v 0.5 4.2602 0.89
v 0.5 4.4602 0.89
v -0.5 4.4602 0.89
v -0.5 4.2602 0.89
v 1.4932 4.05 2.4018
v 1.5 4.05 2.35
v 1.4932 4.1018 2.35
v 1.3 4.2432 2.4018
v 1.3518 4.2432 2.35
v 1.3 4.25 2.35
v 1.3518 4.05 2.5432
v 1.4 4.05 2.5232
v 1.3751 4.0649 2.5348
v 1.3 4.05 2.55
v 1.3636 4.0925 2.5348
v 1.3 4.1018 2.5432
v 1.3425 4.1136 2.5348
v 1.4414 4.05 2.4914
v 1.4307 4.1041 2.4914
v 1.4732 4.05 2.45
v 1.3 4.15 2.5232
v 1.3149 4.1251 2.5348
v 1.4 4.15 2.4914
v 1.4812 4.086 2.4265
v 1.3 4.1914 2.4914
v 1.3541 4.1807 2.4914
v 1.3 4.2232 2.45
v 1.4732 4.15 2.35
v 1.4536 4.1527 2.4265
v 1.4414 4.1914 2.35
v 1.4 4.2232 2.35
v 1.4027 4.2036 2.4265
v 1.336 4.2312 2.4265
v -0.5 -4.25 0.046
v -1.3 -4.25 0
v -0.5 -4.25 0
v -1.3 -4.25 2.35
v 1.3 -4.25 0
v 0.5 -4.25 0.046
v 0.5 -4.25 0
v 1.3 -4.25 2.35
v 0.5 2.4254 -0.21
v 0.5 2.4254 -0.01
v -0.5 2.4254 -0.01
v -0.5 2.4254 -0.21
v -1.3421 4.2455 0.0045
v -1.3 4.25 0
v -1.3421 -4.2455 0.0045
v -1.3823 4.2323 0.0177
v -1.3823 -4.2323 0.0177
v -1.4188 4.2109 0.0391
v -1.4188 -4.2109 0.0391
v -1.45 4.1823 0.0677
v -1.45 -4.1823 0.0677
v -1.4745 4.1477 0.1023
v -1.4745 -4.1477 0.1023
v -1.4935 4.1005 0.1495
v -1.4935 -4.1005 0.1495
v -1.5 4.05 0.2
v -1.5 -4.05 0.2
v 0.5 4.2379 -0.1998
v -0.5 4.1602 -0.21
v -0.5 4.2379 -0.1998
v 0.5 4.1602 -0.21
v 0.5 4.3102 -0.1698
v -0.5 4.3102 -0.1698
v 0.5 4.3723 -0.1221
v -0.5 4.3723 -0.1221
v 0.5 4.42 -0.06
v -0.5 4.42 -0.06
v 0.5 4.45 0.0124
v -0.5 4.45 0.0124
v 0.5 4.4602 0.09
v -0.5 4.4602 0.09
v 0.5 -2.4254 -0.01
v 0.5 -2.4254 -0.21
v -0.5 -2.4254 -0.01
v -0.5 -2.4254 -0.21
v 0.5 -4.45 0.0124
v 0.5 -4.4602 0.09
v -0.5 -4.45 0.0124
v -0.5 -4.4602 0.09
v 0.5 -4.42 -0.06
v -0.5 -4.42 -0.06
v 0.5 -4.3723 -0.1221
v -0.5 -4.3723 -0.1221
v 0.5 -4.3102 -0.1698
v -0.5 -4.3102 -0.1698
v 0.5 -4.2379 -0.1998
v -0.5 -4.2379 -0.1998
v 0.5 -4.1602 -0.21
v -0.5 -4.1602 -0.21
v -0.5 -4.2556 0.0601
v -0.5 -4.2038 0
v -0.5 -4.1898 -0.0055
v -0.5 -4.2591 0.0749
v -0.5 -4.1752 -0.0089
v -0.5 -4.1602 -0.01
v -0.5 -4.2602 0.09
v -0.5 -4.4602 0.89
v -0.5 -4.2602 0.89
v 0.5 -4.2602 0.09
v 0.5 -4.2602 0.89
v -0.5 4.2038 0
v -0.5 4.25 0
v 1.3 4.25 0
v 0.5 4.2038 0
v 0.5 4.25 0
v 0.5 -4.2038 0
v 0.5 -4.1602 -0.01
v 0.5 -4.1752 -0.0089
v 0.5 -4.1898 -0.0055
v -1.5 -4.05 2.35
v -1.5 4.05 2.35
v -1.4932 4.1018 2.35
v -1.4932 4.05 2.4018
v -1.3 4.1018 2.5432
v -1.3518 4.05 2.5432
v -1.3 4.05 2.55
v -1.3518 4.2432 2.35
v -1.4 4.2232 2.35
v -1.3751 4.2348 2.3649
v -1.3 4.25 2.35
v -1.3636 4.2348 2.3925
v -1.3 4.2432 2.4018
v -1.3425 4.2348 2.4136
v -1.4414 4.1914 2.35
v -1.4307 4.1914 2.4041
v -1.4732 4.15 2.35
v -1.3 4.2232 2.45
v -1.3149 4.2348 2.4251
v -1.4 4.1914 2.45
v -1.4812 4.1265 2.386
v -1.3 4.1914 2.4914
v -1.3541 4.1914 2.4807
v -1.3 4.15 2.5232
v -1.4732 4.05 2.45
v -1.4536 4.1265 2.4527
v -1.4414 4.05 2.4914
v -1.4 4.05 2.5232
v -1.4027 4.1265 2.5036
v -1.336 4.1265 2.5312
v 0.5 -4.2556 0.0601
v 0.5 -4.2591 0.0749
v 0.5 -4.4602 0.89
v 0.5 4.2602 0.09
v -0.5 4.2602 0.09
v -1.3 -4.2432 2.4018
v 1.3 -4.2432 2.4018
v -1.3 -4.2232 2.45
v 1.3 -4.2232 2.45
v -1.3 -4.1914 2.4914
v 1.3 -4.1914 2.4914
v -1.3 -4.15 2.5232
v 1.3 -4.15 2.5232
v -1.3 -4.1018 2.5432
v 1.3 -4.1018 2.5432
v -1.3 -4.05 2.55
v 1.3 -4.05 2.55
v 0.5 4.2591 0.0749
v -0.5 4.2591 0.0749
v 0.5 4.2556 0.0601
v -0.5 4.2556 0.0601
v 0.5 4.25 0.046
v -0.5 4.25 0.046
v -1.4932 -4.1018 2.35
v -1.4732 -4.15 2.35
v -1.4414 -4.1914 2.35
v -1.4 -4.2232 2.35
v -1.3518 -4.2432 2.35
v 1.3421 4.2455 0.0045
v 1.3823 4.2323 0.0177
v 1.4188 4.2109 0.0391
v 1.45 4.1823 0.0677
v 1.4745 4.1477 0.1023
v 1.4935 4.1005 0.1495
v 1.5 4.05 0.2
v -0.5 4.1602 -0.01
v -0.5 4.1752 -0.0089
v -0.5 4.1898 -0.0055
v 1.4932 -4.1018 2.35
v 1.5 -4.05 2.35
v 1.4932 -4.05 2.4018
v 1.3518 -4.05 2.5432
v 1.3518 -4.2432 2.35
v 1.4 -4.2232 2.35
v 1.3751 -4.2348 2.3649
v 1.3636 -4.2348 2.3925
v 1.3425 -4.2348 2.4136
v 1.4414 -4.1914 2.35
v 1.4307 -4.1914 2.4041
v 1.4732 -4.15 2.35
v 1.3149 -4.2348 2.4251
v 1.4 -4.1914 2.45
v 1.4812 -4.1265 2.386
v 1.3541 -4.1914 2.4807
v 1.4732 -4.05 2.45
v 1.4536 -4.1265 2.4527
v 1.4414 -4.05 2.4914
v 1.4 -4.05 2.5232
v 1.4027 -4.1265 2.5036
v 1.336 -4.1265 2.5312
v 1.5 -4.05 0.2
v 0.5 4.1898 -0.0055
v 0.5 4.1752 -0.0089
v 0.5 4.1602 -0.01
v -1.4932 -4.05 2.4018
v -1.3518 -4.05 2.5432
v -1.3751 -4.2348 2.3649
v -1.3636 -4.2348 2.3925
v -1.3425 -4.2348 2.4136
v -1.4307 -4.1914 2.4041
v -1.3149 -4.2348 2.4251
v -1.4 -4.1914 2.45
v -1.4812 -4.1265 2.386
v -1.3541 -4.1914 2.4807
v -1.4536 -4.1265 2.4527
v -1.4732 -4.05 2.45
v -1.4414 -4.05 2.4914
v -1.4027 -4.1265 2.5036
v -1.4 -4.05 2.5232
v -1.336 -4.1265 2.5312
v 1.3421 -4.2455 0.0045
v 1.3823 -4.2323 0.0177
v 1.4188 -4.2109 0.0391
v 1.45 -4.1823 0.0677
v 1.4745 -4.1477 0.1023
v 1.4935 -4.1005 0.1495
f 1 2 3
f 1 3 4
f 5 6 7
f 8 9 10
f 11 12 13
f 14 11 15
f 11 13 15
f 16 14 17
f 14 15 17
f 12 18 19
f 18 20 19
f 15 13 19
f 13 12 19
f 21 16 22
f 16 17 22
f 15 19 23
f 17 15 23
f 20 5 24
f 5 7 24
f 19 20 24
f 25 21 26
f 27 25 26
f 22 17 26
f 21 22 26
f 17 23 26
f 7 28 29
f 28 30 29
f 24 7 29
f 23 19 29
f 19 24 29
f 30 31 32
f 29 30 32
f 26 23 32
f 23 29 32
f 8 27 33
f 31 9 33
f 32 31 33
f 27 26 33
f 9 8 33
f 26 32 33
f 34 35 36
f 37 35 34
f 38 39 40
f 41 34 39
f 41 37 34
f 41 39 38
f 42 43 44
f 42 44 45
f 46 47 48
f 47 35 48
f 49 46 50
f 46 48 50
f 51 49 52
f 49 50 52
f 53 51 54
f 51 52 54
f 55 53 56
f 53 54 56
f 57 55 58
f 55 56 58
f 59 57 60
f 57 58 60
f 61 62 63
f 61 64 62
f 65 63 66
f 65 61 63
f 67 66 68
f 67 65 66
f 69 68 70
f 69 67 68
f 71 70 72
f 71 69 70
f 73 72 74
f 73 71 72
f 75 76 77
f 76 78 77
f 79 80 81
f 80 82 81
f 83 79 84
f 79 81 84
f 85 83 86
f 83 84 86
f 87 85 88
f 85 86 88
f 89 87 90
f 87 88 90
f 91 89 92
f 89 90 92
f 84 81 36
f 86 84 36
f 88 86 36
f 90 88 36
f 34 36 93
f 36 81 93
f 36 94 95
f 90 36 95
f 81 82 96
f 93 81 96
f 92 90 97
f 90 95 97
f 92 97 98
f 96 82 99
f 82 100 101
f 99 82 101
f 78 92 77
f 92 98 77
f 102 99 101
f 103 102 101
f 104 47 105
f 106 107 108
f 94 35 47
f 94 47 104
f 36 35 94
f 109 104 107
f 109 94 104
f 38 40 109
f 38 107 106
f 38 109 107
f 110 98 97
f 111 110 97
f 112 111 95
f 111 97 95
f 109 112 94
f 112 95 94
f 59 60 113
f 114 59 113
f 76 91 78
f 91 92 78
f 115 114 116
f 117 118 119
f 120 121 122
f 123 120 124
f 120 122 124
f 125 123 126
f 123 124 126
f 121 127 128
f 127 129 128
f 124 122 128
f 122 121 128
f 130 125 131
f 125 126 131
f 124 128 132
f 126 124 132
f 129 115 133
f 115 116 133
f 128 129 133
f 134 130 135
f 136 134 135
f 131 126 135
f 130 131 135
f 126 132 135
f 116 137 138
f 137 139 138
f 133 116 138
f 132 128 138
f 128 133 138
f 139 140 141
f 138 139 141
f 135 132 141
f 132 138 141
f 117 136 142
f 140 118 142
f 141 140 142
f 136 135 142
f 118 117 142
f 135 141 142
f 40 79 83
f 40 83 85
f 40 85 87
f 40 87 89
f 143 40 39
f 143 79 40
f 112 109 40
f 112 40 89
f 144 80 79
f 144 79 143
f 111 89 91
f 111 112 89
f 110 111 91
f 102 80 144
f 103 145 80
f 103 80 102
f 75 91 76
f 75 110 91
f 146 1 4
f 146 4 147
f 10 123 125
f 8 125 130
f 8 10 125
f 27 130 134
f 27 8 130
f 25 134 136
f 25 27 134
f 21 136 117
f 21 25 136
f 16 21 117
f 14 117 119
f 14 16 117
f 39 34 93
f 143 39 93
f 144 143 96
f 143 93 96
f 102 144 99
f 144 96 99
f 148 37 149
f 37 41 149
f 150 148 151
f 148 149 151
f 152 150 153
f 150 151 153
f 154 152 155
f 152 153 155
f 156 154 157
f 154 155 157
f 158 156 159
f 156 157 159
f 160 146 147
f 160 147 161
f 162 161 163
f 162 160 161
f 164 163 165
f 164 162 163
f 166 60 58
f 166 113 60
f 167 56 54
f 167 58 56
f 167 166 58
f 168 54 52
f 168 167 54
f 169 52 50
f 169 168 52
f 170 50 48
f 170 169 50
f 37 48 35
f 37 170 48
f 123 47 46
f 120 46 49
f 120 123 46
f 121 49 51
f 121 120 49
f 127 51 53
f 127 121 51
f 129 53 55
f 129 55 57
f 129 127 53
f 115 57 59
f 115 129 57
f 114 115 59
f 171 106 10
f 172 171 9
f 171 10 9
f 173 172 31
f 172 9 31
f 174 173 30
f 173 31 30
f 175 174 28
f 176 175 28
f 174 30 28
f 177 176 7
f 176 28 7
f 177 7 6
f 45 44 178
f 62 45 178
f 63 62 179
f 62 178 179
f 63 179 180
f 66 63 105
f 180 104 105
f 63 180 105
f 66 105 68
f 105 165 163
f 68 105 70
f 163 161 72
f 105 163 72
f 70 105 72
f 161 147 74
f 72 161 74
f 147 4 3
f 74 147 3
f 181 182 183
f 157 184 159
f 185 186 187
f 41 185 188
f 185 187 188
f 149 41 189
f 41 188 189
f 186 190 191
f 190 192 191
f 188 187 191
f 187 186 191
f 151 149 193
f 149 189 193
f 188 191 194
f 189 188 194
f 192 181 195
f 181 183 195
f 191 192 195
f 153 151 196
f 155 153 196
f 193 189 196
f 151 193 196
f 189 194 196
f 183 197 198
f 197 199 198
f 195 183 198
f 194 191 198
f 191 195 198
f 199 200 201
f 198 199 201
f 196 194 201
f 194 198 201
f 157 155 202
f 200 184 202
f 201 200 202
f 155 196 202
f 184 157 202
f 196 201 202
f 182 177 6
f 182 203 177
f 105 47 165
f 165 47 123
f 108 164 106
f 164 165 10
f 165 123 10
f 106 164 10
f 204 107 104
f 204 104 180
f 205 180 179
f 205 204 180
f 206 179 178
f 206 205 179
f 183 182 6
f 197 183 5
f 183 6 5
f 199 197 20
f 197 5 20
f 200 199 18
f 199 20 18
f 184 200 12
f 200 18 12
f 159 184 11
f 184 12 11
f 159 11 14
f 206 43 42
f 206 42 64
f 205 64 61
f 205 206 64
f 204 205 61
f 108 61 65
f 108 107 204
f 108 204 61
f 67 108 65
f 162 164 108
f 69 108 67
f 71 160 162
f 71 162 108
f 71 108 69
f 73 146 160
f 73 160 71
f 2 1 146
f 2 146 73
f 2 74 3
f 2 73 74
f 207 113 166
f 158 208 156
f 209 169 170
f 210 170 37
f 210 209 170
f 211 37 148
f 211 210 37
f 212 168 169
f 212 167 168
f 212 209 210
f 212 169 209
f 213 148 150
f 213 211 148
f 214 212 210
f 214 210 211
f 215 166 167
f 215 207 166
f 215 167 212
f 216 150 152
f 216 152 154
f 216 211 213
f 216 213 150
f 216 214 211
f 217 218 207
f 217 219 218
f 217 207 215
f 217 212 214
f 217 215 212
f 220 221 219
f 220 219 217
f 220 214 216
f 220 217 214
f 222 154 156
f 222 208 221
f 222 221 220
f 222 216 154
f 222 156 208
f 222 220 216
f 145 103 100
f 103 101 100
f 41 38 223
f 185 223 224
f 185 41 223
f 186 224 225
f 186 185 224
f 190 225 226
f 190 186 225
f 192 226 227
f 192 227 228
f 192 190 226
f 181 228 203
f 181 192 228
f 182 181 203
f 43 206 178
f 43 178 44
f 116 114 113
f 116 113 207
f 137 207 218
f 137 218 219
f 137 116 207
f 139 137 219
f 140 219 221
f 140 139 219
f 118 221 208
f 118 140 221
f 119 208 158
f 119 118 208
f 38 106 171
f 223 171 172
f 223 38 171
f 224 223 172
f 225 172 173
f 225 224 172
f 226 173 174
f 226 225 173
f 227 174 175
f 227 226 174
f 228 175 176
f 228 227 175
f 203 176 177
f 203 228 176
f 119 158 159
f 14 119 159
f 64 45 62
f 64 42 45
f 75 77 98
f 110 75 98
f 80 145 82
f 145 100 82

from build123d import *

# Parameters (mm, degrees)
F0_W     = 3
F0_H     = 2.55
F1_DEPTH = 4.25
F3_DEPTH = 0.5
F4_R     = 0.2


with BuildPart() as f1:
    # F0 (on Front) → F1 (new body, symmetric)
    with BuildSketch(Plane.XZ):
        with Locations((0, 1.275)):
            Rectangle(F0_W, F0_H)
    extrude(amount=F1_DEPTH, both=True)

    # F2 (on Right) → F3 (join, symmetric)
    with BuildSketch(Plane.YZ):
        with BuildLine():
            Line((-4.260209, 0.09), (-4.260209, 0.89))
            Line((-4.260209, 0.89), (-4.460209, 0.89))
            Line((-4.460209, 0.89), (-4.460209, 0.09))
            ThreePointArc((-4.460209, 0.09), (-4.372341, -0.122132), (-4.160209, -0.21))
            Line((-4.160209, -0.21), (-2.425445, -0.21))
            Line((-2.425445, -0.21), (-2.425445, -0.01))
            Line((-2.425445, -0.01), (-4.160209, -0.01))
            ThreePointArc((-4.160209, -0.01), (-4.23092, 0.019289), (-4.260209, 0.09))
        make_face()
        with BuildLine():
            Line((4.460209, 0.09), (4.460209, 0.89))
            Line((4.460209, 0.89), (4.260209, 0.89))
            Line((4.260209, 0.89), (4.260209, 0.09))
            ThreePointArc((4.260209, 0.09), (4.23092, 0.019289), (4.160209, -0.01))
            Line((4.160209, -0.01), (2.425445, -0.01))
            Line((2.425445, -0.01), (2.425445, -0.21))
            Line((2.425445, -0.21), (4.160209, -0.21))
            ThreePointArc((4.160209, -0.21), (4.372341, -0.122132), (4.460209, 0.09))
        make_face()
    extrude(amount=F3_DEPTH, both=True)

    # F4
    f4_edges = [f1.edges().sort_by_distance(p)[0] for p in [
        (1.5, 4.25, 1.275),
        (1.5, 0, 2.55),
        (1.5, -4.25, 1.275),
        (1.5, 0, 0),
        (-1.5, 0, 2.55),
        (-1.5, 4.25, 1.275),
        (-1.5, 0, 0),
        (-1.5, -4.25, 1.275),
        (0, 4.25, 2.55),
        (0, -4.25, 2.55),
    ]]
    fillet(f4_edges, radius=F4_R)


solid = f1.part
